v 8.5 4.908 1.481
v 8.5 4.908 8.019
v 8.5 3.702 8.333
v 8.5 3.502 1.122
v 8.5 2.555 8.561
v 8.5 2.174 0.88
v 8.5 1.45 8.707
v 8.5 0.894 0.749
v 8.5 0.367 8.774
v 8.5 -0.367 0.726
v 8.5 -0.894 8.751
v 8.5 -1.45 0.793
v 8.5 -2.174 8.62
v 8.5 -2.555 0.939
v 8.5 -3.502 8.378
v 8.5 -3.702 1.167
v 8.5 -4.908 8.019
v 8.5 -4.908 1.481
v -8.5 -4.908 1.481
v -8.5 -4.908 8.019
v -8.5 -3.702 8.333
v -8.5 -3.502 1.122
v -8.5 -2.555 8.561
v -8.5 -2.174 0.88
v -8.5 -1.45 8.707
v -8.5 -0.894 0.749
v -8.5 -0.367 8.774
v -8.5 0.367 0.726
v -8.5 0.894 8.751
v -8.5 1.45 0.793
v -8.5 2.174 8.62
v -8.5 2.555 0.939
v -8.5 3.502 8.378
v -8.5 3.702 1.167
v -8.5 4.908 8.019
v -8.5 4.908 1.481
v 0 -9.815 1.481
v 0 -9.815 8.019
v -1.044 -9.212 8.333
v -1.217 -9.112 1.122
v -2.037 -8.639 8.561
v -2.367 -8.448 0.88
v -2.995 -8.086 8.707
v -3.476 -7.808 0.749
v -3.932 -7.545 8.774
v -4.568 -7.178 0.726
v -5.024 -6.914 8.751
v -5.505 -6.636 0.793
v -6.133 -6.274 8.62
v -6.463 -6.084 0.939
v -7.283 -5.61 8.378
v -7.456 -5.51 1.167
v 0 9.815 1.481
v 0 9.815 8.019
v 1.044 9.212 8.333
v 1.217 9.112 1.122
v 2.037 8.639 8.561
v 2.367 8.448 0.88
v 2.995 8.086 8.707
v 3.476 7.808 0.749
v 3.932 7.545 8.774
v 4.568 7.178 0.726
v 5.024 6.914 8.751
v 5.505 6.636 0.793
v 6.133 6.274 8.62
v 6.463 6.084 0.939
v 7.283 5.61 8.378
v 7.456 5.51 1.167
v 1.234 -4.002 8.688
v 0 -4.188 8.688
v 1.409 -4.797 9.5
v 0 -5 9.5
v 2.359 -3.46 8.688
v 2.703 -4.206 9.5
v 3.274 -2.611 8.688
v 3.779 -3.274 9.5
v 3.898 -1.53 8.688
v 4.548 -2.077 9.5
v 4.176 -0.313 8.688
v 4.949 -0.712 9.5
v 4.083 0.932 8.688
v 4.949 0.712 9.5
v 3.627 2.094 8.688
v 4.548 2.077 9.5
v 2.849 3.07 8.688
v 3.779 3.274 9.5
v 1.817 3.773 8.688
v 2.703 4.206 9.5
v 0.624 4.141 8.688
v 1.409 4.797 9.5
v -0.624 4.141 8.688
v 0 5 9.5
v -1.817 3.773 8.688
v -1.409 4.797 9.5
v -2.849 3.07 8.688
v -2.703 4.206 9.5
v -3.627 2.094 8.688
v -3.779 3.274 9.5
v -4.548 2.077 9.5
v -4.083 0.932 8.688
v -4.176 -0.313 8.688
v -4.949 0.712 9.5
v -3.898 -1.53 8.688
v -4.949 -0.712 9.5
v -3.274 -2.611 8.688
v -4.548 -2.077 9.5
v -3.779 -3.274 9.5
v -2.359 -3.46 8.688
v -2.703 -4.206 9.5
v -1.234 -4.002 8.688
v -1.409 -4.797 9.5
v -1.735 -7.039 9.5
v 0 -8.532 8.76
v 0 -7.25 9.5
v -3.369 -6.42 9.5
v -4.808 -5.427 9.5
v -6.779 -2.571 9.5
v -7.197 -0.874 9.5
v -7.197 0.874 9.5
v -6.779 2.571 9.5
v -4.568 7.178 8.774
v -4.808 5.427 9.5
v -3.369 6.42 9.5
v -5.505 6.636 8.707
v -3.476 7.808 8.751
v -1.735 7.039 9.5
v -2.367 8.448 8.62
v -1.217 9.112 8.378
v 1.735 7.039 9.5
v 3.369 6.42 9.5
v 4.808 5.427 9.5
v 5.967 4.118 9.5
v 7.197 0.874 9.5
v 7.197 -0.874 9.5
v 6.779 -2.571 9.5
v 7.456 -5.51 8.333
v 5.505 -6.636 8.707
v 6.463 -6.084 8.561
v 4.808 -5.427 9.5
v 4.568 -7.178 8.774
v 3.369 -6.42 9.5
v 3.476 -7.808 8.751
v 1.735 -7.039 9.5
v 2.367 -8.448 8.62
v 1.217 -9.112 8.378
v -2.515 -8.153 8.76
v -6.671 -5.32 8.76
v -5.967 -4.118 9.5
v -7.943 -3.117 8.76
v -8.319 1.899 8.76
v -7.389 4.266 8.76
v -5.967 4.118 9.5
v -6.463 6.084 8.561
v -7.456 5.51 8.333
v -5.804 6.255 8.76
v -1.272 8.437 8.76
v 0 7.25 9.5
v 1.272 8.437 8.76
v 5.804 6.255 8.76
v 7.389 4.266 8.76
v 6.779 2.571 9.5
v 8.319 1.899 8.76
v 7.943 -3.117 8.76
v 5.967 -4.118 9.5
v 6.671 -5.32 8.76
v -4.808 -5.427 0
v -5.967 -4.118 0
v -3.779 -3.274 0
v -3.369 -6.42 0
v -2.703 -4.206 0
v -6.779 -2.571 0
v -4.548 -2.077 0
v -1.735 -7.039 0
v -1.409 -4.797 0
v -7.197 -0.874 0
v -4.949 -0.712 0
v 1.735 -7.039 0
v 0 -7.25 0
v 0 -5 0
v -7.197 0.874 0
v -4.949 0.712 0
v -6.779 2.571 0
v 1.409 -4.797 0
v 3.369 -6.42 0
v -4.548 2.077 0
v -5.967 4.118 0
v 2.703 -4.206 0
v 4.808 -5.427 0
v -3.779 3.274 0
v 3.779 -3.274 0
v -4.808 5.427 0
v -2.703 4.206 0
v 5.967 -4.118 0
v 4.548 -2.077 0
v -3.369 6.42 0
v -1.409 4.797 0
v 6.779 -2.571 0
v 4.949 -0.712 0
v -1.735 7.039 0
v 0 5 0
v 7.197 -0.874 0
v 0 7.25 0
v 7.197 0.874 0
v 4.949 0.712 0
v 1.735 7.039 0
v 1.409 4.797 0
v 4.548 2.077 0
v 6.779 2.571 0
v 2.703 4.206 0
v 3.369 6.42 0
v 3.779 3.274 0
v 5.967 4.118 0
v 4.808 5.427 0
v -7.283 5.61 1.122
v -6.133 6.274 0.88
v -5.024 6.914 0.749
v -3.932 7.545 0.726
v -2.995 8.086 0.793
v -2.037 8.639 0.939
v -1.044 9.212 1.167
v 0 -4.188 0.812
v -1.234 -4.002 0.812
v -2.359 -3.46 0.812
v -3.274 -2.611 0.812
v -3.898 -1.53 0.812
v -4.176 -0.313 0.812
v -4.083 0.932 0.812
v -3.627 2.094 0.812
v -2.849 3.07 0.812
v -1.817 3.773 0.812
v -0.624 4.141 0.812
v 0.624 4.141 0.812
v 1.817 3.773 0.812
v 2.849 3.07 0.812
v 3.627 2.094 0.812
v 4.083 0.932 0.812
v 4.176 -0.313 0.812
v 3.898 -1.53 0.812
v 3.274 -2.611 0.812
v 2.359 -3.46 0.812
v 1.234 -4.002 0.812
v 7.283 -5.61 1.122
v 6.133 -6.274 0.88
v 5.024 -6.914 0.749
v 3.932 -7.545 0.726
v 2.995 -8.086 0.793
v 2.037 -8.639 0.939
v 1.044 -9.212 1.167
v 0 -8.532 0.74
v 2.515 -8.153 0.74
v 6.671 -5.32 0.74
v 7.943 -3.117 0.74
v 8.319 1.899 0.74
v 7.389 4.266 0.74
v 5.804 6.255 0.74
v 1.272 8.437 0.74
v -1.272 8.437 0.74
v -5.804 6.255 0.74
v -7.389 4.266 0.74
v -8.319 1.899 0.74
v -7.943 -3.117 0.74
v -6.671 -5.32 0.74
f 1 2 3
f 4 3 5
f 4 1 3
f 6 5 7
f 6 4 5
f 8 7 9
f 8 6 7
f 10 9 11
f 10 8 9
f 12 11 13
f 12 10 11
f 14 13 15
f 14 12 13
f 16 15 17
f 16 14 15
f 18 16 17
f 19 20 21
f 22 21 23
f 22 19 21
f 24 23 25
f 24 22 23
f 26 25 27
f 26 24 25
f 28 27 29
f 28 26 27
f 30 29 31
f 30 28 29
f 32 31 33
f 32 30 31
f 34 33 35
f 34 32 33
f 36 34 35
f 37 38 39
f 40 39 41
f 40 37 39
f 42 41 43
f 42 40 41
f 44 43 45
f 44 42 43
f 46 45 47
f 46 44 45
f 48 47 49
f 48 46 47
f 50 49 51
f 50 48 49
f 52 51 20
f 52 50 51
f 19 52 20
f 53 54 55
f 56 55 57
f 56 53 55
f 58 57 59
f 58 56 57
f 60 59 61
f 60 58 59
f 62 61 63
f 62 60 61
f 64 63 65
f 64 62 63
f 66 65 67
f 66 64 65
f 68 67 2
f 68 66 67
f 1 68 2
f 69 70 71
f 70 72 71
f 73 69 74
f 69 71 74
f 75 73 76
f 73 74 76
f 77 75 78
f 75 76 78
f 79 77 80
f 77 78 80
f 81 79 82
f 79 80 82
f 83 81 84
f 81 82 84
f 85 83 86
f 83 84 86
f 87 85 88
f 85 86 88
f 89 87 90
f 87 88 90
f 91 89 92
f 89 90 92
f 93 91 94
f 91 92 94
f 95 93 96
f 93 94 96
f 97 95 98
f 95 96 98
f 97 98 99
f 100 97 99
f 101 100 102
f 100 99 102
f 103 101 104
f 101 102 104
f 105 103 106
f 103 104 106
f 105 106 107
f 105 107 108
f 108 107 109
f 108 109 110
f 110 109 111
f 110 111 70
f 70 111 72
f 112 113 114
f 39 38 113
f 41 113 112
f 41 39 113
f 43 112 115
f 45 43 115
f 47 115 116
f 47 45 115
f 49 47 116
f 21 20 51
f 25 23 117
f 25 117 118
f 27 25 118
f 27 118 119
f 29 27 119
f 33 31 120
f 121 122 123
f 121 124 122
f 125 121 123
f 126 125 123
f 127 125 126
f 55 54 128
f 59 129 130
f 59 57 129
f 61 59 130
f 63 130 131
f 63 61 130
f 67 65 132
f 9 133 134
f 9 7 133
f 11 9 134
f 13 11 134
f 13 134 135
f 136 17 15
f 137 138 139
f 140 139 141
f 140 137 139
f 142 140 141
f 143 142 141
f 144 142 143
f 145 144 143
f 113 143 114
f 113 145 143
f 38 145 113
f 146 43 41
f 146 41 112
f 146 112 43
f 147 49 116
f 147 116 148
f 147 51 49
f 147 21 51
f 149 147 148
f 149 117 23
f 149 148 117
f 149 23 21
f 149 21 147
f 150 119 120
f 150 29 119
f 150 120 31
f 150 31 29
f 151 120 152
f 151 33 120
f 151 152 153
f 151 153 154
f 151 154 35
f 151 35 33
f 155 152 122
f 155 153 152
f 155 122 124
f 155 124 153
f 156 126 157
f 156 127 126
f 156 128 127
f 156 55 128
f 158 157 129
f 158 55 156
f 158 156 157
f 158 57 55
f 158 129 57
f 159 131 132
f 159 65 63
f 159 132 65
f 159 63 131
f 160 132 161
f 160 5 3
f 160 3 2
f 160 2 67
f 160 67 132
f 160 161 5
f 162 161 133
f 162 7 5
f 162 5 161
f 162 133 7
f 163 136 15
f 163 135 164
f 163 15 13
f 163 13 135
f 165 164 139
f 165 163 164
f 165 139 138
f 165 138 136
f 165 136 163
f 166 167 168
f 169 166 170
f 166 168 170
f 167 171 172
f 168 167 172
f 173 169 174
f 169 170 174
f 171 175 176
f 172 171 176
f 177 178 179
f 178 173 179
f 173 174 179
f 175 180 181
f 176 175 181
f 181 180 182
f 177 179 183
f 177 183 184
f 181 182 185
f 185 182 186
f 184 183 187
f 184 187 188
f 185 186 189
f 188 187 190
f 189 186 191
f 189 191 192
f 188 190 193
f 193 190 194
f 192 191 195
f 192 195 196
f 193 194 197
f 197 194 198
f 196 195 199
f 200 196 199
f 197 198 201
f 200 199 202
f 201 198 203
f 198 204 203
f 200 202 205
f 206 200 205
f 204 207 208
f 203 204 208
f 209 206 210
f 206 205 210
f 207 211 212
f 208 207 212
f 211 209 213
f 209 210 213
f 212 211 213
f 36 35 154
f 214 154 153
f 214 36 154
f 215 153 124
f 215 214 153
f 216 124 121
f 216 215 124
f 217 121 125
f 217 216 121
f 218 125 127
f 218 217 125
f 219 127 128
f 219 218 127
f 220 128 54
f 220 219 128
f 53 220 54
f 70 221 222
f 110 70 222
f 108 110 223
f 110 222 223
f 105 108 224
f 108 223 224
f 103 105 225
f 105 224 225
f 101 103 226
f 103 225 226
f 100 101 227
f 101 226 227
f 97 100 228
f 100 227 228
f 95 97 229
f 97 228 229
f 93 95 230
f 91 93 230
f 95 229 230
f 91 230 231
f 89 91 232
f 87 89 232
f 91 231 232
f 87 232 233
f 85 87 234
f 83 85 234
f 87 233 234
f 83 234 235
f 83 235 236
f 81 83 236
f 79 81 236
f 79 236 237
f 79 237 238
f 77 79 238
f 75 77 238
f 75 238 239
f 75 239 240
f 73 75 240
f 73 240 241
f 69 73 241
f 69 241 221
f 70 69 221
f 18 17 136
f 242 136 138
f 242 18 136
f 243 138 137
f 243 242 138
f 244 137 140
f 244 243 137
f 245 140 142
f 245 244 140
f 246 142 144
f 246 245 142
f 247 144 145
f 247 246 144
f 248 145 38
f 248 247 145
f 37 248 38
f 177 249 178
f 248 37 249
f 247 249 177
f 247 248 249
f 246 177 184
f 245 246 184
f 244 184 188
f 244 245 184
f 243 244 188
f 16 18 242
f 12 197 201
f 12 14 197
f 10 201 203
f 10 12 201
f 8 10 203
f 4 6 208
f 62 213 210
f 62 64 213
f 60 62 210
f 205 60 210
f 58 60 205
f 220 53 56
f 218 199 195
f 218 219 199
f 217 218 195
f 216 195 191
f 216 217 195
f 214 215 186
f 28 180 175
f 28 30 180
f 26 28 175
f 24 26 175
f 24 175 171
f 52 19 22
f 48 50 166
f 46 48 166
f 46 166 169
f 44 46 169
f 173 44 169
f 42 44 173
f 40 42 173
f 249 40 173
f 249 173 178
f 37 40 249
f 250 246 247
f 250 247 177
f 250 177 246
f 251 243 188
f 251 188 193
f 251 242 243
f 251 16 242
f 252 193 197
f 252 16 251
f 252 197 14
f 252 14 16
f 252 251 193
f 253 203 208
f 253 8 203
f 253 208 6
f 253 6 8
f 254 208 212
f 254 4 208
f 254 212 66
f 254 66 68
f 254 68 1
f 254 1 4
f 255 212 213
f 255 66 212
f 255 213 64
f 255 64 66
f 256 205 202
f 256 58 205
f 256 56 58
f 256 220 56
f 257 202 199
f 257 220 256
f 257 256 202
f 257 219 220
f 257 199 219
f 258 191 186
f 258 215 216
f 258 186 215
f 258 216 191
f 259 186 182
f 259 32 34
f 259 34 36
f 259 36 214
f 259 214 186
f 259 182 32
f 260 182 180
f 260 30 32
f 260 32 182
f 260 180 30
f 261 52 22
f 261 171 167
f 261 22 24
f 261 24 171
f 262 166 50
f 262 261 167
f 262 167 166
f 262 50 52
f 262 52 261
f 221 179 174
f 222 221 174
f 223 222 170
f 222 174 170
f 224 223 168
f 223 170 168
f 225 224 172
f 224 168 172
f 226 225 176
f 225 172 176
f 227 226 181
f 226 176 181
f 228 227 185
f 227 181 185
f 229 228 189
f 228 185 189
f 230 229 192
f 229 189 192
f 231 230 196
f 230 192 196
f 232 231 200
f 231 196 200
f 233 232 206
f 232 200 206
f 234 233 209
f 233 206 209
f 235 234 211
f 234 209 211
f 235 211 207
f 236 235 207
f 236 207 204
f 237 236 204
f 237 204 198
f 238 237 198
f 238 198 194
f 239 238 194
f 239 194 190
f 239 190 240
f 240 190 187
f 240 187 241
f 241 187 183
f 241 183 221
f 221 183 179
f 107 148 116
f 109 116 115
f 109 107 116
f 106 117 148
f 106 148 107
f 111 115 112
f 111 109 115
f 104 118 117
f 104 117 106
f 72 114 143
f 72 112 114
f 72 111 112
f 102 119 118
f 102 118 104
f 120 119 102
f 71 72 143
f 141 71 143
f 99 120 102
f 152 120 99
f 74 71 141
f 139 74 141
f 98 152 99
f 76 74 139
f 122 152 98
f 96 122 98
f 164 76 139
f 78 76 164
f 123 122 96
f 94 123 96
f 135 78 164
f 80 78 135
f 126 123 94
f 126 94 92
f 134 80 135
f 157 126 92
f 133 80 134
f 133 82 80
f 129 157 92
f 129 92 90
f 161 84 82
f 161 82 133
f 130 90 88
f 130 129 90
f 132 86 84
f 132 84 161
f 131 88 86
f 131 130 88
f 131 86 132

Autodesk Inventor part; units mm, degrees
ref_plane "YZ Plane" through (0, 0, 0) normal (1, 0, 0) x (0, 1, 0)
sketch "Sketch1" plane through (0, 0, 0) normal (0, 0, 1) x (1, 0, 0)
  line L0 (-11.9, 0) -> (11.9, 0) construction
  line L1 (0, -13.7409) -> (0, 13.7409) construction
  line L2 (0, 9.815) -> (8.5, 4.9075)
  line L3 (8.5, 4.9075) -> (8.5, -4.9075)
  line L4 (8.5, -4.9075) -> (0, -9.815)
  line L5 (0, -9.815) -> (-8.5, -4.9075)
  line L6 (-8.5, -4.9075) -> (-8.5, 4.9075)
  line L7 (-8.5, 4.9075) -> (0, 9.815)
  point P0 (0, 0)
  point P1 (0, 0)
  dimension "d67" = 17
extrude "Выдавливание1" add sketch "Sketch1" along normal blind 9.5
ref_plane "Work Plane1" through (0, 0, 10.45) normal (0, 0, 1) x (1, 0, 0)
ref_plane "Work Plane2" through (0, 0, 4.75) normal (0, 0, 1) x (1, 0, 0)
sketch "Sketch2" plane through (0, 0, 9.5) normal (0, 0, 1) x (1, 0, 0)
  point P0 (0, 0)
hole "Отверстие1" at (0, 0, 9.5) direction (0, 0, -1) diameter 8.376 end through all thread size "M10x1.5" class "6H" standard "ISO Metric profile"
sketch "Sketch3" plane through (0, 0, 0) normal (1, 0, 0) x (0, 1, 0)
  line L0 (-4.9075, 9.5) -> (4.9075, 9.5) construction
  line L1 (4.9075, 9.5) -> (9.815, 9.5) construction
  line L2 (-9.815, 9.5) -> (-4.9075, 9.5) construction
  line L3 (-4.188, 0) -> (-4.188, 9.5) construction
  line L4 (4.9075, 0) -> (4.9075, 9.5) construction
  line L5 (0, -1.9) -> (0, 11.4) construction
  line L6 (-5, 9.5) -> (0, 4.5)
  line L7 (0, 4.5) -> (0, 9.5)
  line L8 (0, 9.5) -> (-5, 9.5)
  line L9 (5, 9.5) -> (0, 4.5)
  line L10 (0, 9.5) -> (5, 9.5)
  point P0 (0, 0)
  dimension "d57" = 45
  dimension "d58" = 10
revolve "Вращение1" cut sketch "Sketch3" angle 360 about axis through (0, 0, -10) along (0, 0, 1) contours L8 L7 L6
sketch "Sketch4" plane through (0, 0, 0) normal (1, 0, 0) x (0, 1, 0)
  line L0 (-7.25, 9.5) -> (-12.25, 6.6132)
  line L1 (-12.25, 6.6132) -> (-12.25, 9.5)
  line L2 (0, -1.9) -> (0, 11.4) construction
  line L3 (-7.25, 9.5) -> (-12.25, 9.5)
  line L4 (7.25, 9.5) -> (12.25, 6.6132)
  line L5 (12.25, 6.6132) -> (12.25, 9.5)
  line L6 (7.25, 9.5) -> (12.25, 9.5)
  point P0 (0, 0)
  dimension "d11" = 30
  dimension "d12" = 14.5
  dimension "d13" = 24.5
  dimension "d60" = 9.5
revolve "Вращение2" cut sketch "Sketch4" angle 360 about axis through (0, 0, -10) along (0, 0, 1) contours L0 L1 L3
mirror "Симметричное отображение1" about plane through (0, 0, 4.75) normal (0, 0, 1) of "Вращение2"
sketch "Sketch5" plane through (0, 0, 0) normal (1, 0, 0) x (0, 1, 0)
  line L0 (4.188, 0) -> (-4.188, 0) construction
  line L1 (0, -1.9) -> (0, 11.4) construction
  line L2 (-5, 0) -> (0, 5)
  line L3 (0, 0) -> (-5, 0)
  line L4 (-4.188, 0) -> (4.188, 0) construction
  line L5 (2.5, 0) -> (-2.5, 0) construction
  line L6 (5, 0) -> (0, 5)
  line L7 (0, 0) -> (5, 0)
  line L8 (0, 5) -> (0, 0)
  point P0 (-1.2295, 3.4)
  point P1 (1.2295, 3.4)
  point P2 (-4.188, 9.5)
  dimension "d54" = 45
  dimension "d55" = 10
revolve "Вращение3" cut sketch "Sketch5" angle 360 about axis through (0, 0, -10) along (0, 0, 1) contours L2 L8 L3
equation "\"d67\" = S_"
equation "\"d1\" = m_"
equation "\"d12\" = dw"
equation "\"d13\" = dw + da"
equation "\"d60\" = m_"
equation "\"d55\" = da"
equation "\"d58\" = da"
equation "\"S_\" = 17"
equation "\"e\" = 18.48"
equation "\"da\" = 10"
equation "\"dw\" = 14.5"
equation "\"m_\" = 9.5"
equation "\"d15\" = 0.1 * m_"
properties part number "ГайкаM10ГОСТ ISO 4034-2014" material "Сталь, мягкая"
